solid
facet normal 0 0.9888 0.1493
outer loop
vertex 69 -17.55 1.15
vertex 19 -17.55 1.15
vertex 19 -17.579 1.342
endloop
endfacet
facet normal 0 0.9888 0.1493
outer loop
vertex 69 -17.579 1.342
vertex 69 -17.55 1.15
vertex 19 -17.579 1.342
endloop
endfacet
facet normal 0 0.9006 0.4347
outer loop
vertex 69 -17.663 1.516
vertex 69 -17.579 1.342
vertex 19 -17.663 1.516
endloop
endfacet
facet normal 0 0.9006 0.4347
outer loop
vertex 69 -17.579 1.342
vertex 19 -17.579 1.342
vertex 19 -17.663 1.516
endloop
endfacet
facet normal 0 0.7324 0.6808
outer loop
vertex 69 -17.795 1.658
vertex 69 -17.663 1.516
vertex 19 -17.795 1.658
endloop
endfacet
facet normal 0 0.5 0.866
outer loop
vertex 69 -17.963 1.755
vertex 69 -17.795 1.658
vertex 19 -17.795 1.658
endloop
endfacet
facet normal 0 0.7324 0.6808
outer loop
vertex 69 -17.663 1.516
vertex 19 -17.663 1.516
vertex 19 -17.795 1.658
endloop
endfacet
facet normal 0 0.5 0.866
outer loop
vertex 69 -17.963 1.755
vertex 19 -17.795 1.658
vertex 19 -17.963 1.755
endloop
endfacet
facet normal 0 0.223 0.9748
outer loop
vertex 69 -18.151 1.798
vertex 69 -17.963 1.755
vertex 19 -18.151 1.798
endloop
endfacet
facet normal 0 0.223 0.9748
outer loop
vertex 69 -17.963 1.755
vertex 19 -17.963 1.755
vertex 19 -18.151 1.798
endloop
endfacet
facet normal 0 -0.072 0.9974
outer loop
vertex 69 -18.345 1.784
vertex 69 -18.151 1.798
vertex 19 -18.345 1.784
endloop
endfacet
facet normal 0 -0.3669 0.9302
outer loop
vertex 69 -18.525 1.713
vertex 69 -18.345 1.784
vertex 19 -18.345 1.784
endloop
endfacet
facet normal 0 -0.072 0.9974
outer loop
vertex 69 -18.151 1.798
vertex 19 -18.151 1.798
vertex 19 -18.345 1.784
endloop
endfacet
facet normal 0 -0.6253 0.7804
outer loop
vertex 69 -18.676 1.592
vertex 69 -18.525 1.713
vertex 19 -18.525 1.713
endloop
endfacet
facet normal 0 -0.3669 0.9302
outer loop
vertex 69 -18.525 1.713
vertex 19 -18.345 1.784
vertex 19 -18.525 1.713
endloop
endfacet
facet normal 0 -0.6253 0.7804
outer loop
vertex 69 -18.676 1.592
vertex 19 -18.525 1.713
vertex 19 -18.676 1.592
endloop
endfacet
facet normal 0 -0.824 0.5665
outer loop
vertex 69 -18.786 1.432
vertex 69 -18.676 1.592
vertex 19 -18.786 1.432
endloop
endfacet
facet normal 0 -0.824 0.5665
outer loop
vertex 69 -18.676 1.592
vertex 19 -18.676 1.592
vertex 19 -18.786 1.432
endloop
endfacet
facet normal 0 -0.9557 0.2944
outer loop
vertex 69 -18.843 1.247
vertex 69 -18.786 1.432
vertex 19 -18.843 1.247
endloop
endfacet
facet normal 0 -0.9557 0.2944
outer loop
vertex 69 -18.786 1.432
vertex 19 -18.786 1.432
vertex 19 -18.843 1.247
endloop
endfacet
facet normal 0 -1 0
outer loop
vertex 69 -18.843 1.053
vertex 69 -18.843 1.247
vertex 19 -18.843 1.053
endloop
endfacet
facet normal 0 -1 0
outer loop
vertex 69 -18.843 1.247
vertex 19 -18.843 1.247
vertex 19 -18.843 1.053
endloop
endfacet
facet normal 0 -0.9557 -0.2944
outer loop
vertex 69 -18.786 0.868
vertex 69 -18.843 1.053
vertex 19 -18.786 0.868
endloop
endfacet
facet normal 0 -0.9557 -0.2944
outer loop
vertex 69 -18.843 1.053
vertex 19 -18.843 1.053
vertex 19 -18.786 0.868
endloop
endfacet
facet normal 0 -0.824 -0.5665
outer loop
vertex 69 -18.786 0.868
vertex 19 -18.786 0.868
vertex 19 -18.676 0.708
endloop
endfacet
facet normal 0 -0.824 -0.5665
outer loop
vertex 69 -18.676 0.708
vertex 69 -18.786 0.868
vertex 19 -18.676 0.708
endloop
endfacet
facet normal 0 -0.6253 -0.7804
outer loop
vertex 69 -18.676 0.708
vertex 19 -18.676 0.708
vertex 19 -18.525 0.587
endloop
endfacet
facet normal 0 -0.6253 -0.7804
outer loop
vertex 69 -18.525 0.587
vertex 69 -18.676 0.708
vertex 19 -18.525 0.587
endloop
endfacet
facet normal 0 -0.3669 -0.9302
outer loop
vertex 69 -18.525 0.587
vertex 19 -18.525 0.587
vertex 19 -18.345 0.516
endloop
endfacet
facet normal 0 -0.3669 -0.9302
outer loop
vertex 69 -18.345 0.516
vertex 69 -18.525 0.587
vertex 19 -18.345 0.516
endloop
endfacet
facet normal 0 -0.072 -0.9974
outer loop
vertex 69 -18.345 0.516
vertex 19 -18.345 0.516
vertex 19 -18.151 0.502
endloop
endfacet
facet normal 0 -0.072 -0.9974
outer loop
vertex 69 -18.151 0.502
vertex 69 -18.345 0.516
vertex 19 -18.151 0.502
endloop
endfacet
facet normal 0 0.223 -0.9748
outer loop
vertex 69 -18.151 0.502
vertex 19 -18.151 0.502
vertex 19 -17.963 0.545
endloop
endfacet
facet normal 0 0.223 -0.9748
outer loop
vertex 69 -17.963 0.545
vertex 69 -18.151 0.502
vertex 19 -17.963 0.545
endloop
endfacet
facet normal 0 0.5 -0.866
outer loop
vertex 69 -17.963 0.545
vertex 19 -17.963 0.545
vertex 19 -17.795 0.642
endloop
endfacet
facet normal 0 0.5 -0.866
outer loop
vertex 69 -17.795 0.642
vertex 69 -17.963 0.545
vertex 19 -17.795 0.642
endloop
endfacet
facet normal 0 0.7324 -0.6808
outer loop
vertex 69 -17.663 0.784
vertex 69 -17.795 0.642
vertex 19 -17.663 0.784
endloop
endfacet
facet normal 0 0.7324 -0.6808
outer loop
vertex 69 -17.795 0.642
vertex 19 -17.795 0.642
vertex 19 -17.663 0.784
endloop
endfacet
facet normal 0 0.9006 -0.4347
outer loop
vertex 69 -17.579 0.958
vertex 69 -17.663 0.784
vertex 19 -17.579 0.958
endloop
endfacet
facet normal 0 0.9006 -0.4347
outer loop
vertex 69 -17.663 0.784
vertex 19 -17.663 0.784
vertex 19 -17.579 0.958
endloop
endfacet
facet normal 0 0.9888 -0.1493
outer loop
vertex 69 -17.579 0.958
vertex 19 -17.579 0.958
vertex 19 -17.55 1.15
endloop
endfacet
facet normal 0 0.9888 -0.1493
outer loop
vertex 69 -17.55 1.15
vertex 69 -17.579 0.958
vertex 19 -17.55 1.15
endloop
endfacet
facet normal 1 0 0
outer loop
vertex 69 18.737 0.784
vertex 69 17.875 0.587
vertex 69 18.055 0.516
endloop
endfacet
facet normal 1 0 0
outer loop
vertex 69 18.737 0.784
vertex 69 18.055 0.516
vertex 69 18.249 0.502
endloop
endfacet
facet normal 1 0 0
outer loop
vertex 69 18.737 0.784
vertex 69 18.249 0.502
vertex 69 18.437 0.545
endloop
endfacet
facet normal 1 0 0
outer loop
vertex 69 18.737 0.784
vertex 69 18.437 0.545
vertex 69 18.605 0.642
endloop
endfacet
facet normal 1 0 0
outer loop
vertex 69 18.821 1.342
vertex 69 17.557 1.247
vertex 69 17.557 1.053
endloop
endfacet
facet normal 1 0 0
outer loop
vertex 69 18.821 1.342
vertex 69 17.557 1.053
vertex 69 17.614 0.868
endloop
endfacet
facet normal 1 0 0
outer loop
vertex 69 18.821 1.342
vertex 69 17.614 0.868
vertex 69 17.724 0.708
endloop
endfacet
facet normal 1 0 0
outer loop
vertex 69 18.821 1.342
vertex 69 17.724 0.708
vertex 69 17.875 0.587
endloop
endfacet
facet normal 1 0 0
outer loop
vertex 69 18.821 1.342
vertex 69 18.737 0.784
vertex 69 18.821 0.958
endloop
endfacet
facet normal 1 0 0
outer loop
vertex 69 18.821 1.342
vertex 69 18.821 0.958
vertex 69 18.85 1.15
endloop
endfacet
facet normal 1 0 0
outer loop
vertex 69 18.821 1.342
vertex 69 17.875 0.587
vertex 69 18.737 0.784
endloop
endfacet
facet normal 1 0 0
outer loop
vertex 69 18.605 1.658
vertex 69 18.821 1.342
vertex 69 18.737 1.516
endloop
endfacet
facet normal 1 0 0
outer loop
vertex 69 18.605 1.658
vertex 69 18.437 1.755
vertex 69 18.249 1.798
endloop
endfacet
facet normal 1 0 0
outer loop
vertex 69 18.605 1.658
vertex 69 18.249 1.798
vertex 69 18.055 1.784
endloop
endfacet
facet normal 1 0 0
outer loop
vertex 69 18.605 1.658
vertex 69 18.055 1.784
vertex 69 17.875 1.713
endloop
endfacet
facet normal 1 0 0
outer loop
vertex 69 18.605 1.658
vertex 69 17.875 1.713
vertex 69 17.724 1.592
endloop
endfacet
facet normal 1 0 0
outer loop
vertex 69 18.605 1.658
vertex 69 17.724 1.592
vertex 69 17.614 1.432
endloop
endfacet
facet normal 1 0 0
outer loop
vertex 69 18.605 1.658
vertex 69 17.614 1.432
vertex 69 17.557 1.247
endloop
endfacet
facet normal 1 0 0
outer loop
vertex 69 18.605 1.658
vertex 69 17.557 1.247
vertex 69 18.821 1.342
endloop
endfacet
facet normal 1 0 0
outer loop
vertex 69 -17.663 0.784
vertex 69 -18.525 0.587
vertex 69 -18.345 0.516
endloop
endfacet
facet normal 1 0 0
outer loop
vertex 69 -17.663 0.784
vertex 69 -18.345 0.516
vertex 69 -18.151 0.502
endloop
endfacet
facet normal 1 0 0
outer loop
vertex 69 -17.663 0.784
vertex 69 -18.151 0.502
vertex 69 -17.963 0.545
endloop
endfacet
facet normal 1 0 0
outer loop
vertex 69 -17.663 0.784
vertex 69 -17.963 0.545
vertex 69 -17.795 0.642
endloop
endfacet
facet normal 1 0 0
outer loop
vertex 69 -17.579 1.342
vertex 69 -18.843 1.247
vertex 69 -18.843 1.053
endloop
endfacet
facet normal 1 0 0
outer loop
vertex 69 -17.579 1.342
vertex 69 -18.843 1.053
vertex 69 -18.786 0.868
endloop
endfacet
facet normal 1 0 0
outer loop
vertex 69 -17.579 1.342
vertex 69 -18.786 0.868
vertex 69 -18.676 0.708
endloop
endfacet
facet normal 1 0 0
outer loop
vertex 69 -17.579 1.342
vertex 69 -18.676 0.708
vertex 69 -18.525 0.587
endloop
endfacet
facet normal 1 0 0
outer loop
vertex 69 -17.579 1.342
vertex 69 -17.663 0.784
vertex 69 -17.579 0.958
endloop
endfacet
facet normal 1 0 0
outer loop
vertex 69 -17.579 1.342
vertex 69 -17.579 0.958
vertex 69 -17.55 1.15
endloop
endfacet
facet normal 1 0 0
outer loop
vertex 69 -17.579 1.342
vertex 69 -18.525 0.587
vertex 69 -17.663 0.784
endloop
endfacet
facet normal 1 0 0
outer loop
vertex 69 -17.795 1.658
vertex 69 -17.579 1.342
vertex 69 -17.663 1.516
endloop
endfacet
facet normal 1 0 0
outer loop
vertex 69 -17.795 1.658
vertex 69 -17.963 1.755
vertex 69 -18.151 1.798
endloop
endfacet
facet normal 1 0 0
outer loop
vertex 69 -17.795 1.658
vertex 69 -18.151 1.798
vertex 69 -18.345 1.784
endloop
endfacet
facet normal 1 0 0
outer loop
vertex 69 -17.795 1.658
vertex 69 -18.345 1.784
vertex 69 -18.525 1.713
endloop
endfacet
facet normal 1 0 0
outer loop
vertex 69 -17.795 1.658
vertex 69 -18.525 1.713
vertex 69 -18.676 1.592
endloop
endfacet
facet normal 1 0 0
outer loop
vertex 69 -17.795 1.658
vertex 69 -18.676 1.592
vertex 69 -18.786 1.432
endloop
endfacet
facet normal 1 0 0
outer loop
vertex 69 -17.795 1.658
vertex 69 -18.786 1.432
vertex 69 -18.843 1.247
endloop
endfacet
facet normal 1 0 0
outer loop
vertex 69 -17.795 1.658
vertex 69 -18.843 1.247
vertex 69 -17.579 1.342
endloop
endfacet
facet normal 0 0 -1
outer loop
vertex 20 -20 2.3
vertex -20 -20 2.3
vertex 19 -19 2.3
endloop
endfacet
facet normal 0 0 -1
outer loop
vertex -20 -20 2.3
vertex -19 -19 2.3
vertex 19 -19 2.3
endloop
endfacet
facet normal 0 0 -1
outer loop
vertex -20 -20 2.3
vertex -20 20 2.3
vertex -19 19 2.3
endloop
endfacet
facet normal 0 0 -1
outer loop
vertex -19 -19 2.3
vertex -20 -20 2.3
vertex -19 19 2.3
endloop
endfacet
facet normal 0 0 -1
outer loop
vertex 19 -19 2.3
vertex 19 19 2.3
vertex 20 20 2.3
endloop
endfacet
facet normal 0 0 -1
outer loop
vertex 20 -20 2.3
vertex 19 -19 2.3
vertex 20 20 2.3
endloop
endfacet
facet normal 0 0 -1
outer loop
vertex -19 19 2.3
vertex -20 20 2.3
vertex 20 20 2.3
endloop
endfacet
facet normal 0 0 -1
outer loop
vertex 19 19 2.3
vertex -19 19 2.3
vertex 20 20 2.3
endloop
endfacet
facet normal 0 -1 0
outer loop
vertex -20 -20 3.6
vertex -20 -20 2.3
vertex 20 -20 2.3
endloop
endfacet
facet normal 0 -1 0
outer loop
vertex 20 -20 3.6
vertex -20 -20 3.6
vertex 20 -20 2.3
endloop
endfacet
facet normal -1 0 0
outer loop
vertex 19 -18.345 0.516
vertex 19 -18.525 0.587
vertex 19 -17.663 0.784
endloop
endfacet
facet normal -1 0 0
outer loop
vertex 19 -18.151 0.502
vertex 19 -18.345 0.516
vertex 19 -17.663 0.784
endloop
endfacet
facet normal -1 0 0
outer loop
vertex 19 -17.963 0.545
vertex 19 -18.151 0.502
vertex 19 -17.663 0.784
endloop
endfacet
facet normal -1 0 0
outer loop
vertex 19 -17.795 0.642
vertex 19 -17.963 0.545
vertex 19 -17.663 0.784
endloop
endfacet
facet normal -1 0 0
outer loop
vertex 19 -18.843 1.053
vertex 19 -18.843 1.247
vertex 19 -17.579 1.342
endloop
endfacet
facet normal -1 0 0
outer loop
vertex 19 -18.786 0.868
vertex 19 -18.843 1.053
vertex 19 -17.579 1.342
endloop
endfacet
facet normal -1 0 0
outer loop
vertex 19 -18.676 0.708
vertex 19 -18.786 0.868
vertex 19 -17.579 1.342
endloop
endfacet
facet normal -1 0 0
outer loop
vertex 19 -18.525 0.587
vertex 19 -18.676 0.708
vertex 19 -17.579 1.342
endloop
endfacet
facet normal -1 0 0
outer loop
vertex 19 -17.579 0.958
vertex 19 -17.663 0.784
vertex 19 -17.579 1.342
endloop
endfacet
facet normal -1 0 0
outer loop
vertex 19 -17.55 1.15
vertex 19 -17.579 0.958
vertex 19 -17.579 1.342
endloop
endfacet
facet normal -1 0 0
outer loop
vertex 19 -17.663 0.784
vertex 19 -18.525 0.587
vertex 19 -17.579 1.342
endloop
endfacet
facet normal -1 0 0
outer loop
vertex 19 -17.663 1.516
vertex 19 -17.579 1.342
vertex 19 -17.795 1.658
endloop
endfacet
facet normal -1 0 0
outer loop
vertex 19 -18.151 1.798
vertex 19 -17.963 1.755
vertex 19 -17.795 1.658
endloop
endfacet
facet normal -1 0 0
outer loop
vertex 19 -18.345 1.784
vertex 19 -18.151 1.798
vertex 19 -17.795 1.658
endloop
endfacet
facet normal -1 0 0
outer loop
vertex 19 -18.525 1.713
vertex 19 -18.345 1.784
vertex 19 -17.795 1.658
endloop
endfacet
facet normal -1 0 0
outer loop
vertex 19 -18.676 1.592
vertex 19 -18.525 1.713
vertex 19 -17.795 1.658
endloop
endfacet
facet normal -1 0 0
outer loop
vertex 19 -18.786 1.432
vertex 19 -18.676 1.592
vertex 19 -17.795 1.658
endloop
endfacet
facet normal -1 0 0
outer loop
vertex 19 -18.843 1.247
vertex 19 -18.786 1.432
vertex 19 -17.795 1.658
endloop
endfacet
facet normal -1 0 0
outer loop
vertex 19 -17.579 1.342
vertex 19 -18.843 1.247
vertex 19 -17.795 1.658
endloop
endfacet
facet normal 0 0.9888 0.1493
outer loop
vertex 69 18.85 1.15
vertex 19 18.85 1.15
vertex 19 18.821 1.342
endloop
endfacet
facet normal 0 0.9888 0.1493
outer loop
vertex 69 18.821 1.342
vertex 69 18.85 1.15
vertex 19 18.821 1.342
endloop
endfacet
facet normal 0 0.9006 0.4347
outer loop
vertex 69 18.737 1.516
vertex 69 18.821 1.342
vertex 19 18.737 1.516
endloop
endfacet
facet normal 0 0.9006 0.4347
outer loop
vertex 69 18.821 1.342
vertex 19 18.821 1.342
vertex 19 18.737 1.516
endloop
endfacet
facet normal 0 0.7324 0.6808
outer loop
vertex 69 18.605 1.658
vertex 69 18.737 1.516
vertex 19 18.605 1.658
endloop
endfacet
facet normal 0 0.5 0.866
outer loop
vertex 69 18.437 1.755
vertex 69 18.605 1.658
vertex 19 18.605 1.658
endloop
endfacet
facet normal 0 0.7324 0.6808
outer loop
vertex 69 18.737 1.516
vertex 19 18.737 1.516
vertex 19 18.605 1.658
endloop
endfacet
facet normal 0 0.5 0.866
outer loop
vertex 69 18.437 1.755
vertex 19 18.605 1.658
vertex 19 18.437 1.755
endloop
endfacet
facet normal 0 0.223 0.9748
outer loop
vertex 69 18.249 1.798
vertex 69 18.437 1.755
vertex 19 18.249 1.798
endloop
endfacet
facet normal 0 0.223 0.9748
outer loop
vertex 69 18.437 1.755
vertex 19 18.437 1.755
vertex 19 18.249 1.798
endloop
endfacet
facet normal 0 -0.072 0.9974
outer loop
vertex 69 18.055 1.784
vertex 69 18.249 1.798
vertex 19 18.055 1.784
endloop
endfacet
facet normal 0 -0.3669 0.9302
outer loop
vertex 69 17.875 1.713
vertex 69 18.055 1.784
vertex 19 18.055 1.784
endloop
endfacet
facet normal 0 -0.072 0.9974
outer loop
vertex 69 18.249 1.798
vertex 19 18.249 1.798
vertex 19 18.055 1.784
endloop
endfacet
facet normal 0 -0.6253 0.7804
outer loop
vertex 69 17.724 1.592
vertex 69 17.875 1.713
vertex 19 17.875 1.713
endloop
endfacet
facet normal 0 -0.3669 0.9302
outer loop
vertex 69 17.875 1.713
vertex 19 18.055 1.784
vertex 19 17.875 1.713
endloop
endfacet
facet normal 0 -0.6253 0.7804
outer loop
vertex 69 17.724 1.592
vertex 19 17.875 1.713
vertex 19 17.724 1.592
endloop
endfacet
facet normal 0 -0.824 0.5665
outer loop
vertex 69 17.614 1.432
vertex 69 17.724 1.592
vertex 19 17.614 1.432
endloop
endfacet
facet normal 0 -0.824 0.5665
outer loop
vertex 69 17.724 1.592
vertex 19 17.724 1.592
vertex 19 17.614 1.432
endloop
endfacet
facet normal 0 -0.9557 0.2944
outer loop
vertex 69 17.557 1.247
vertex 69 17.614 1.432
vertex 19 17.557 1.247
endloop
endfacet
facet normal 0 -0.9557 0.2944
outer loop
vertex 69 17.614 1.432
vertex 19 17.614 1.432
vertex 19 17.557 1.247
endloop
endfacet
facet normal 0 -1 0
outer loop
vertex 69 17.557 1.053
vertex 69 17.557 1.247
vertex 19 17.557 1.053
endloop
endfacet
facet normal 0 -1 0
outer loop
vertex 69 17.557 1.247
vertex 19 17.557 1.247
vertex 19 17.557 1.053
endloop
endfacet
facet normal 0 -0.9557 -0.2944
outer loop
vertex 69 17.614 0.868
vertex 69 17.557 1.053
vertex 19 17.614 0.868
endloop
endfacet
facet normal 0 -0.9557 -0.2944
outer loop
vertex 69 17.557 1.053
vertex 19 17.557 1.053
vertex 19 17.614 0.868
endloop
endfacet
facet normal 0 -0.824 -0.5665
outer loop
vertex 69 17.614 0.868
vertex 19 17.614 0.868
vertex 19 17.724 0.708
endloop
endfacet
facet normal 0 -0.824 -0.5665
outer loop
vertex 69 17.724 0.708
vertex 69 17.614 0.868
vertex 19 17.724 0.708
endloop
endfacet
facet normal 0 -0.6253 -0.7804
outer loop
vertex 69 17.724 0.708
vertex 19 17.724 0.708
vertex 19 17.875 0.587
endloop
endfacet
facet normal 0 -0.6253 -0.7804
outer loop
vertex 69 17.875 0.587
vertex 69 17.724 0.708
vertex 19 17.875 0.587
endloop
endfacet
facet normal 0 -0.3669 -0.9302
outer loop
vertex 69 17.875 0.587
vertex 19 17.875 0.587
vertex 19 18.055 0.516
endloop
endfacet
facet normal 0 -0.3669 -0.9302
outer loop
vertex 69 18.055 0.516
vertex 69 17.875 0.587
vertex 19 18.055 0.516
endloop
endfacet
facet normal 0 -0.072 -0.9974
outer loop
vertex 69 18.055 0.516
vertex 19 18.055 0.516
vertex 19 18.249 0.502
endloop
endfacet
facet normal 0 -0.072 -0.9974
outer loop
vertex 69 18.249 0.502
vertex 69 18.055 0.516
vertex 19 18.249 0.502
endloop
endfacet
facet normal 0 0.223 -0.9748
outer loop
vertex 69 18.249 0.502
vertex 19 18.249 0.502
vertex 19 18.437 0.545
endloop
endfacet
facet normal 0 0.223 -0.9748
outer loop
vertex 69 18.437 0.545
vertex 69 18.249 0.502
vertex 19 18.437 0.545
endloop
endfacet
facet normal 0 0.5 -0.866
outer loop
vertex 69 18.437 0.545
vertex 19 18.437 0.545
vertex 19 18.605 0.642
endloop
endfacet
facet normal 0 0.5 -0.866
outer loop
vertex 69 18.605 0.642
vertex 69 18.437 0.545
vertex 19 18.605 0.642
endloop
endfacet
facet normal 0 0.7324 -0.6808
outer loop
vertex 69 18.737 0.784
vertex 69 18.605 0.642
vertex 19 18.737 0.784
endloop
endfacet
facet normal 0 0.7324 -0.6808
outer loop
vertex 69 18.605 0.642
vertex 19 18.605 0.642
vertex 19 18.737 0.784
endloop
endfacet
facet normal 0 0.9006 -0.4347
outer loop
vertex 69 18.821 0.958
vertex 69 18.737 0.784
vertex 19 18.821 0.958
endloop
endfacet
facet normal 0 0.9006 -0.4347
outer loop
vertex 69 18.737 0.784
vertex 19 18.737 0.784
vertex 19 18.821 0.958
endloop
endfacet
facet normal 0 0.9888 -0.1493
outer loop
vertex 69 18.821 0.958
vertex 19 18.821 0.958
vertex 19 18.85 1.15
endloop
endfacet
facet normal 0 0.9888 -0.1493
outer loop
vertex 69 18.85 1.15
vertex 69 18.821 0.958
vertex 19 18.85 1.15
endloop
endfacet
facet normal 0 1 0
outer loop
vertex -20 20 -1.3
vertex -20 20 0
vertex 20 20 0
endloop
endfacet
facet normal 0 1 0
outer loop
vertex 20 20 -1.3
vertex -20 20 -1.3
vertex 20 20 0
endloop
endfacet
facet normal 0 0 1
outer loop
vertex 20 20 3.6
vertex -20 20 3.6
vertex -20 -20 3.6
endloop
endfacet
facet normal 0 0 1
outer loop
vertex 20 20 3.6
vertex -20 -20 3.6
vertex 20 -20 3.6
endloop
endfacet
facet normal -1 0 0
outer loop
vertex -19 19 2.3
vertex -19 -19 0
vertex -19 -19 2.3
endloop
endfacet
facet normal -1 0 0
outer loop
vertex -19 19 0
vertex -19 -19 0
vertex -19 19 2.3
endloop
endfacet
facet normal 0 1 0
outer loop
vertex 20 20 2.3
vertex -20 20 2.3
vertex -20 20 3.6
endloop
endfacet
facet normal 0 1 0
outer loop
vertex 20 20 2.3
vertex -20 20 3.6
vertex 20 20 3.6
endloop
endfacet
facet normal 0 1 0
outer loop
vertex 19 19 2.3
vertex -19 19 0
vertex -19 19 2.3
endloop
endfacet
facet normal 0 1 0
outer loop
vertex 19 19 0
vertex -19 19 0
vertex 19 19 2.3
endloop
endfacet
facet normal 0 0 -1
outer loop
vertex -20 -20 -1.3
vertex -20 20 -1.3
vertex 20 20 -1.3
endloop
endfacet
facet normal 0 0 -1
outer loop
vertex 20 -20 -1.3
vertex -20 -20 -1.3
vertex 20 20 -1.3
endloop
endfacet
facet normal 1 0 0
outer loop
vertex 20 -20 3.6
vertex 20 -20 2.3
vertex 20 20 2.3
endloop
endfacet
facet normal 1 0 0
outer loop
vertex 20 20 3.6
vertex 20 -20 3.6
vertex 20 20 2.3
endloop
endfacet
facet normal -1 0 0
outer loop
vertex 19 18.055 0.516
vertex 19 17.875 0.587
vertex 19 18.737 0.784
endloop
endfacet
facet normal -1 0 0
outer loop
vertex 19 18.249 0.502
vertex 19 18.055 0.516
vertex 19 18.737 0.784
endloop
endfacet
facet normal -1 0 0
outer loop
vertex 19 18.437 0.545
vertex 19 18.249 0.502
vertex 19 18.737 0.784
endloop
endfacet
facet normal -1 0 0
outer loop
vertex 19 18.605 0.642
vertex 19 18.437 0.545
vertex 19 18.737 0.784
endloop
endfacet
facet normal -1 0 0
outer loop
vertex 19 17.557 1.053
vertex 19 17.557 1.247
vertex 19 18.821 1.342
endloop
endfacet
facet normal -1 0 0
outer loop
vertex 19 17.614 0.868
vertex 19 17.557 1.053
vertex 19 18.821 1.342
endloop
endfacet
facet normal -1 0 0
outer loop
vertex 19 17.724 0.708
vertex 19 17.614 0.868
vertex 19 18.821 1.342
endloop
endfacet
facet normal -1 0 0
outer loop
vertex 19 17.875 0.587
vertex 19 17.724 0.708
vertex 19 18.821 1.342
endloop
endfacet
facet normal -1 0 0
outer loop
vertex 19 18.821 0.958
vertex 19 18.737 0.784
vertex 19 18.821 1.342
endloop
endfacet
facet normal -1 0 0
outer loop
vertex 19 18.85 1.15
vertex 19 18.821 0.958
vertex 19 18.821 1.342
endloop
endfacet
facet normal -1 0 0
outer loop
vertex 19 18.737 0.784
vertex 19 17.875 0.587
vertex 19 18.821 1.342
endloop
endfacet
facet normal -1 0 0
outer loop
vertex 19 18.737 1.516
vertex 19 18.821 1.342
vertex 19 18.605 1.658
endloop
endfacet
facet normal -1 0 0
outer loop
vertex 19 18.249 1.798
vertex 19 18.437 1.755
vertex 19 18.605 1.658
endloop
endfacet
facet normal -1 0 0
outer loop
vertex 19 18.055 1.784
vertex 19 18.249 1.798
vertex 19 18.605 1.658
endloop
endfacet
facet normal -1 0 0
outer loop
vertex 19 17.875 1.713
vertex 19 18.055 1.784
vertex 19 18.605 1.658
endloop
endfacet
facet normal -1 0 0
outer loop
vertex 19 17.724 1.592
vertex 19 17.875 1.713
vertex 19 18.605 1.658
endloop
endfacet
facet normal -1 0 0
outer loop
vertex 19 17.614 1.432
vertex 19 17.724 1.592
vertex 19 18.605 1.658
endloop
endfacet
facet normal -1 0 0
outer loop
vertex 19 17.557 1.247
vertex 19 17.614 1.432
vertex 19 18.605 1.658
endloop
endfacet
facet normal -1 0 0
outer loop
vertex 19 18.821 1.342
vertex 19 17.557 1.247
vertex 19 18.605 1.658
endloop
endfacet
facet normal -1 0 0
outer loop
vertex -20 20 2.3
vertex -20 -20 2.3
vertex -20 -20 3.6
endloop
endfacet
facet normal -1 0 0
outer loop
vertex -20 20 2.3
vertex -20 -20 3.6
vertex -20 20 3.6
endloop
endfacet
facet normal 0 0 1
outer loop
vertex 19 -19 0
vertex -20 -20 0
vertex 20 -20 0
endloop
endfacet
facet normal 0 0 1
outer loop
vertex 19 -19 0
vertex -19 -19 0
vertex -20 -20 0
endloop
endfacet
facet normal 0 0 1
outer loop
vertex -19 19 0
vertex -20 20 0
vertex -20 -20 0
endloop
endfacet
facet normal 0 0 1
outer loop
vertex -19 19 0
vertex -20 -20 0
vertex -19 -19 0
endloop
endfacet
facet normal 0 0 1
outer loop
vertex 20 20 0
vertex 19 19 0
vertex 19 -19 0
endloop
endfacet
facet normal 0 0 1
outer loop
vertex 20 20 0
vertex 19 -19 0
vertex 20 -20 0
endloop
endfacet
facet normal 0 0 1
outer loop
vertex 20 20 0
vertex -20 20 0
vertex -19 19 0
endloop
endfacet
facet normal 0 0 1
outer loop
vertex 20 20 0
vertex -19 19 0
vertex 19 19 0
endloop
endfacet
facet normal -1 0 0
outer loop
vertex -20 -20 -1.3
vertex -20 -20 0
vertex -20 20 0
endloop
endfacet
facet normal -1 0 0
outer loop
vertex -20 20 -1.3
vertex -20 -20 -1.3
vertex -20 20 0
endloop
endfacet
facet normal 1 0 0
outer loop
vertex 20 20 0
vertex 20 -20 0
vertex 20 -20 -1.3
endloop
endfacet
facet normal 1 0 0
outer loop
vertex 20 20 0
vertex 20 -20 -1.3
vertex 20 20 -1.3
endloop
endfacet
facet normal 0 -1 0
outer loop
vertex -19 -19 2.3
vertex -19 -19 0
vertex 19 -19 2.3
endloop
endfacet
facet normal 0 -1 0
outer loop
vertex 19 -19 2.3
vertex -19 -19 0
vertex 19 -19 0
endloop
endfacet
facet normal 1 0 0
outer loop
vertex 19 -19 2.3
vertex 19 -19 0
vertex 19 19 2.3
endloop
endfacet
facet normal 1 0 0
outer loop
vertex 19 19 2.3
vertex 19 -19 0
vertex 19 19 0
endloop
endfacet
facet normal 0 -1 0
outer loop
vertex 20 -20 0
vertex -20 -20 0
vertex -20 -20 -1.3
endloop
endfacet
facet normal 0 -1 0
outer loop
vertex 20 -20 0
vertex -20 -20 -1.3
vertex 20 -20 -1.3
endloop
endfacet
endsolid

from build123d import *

# Parameters (mm, degrees)
F0_W     = 40
F0_H     = 40
F1_DEPTH = 1.3
F2_W     = 38
F2_H     = 38
F3_DEPTH = 2.3
F4_W     = 40
F4_H     = 40
F5_DEPTH = 1.3
F6_R     = 0.65
F7_DEPTH = 50


with BuildPart() as f1:
    # F0 (on Top) → F1 (new body)
    with BuildSketch(Plane.XY):
        Rectangle(F0_W, F0_H)
    extrude(amount=-F1_DEPTH)

    # F2 (on face) → F3 (join)
    with BuildSketch(Plane.XY):
        Rectangle(F2_W, F2_H)
    extrude(amount=F3_DEPTH)

    # F4 (on face) → F5 (join)
    with BuildSketch(Plane.XY.offset(2.3)):
        Rectangle(F4_W, F4_H)
    extrude(amount=F5_DEPTH)


with BuildPart() as f7:
    # F6 (on face) → F7 (new body)
    with BuildSketch(Plane.YZ.offset(19)):
        with Locations((-18.2, 1.15)):
            Circle(F6_R)
        with Locations((18.2, 1.15)):
            Circle(F6_R)
    extrude(amount=F7_DEPTH)


solid = Compound([f1.part, f7.part])
